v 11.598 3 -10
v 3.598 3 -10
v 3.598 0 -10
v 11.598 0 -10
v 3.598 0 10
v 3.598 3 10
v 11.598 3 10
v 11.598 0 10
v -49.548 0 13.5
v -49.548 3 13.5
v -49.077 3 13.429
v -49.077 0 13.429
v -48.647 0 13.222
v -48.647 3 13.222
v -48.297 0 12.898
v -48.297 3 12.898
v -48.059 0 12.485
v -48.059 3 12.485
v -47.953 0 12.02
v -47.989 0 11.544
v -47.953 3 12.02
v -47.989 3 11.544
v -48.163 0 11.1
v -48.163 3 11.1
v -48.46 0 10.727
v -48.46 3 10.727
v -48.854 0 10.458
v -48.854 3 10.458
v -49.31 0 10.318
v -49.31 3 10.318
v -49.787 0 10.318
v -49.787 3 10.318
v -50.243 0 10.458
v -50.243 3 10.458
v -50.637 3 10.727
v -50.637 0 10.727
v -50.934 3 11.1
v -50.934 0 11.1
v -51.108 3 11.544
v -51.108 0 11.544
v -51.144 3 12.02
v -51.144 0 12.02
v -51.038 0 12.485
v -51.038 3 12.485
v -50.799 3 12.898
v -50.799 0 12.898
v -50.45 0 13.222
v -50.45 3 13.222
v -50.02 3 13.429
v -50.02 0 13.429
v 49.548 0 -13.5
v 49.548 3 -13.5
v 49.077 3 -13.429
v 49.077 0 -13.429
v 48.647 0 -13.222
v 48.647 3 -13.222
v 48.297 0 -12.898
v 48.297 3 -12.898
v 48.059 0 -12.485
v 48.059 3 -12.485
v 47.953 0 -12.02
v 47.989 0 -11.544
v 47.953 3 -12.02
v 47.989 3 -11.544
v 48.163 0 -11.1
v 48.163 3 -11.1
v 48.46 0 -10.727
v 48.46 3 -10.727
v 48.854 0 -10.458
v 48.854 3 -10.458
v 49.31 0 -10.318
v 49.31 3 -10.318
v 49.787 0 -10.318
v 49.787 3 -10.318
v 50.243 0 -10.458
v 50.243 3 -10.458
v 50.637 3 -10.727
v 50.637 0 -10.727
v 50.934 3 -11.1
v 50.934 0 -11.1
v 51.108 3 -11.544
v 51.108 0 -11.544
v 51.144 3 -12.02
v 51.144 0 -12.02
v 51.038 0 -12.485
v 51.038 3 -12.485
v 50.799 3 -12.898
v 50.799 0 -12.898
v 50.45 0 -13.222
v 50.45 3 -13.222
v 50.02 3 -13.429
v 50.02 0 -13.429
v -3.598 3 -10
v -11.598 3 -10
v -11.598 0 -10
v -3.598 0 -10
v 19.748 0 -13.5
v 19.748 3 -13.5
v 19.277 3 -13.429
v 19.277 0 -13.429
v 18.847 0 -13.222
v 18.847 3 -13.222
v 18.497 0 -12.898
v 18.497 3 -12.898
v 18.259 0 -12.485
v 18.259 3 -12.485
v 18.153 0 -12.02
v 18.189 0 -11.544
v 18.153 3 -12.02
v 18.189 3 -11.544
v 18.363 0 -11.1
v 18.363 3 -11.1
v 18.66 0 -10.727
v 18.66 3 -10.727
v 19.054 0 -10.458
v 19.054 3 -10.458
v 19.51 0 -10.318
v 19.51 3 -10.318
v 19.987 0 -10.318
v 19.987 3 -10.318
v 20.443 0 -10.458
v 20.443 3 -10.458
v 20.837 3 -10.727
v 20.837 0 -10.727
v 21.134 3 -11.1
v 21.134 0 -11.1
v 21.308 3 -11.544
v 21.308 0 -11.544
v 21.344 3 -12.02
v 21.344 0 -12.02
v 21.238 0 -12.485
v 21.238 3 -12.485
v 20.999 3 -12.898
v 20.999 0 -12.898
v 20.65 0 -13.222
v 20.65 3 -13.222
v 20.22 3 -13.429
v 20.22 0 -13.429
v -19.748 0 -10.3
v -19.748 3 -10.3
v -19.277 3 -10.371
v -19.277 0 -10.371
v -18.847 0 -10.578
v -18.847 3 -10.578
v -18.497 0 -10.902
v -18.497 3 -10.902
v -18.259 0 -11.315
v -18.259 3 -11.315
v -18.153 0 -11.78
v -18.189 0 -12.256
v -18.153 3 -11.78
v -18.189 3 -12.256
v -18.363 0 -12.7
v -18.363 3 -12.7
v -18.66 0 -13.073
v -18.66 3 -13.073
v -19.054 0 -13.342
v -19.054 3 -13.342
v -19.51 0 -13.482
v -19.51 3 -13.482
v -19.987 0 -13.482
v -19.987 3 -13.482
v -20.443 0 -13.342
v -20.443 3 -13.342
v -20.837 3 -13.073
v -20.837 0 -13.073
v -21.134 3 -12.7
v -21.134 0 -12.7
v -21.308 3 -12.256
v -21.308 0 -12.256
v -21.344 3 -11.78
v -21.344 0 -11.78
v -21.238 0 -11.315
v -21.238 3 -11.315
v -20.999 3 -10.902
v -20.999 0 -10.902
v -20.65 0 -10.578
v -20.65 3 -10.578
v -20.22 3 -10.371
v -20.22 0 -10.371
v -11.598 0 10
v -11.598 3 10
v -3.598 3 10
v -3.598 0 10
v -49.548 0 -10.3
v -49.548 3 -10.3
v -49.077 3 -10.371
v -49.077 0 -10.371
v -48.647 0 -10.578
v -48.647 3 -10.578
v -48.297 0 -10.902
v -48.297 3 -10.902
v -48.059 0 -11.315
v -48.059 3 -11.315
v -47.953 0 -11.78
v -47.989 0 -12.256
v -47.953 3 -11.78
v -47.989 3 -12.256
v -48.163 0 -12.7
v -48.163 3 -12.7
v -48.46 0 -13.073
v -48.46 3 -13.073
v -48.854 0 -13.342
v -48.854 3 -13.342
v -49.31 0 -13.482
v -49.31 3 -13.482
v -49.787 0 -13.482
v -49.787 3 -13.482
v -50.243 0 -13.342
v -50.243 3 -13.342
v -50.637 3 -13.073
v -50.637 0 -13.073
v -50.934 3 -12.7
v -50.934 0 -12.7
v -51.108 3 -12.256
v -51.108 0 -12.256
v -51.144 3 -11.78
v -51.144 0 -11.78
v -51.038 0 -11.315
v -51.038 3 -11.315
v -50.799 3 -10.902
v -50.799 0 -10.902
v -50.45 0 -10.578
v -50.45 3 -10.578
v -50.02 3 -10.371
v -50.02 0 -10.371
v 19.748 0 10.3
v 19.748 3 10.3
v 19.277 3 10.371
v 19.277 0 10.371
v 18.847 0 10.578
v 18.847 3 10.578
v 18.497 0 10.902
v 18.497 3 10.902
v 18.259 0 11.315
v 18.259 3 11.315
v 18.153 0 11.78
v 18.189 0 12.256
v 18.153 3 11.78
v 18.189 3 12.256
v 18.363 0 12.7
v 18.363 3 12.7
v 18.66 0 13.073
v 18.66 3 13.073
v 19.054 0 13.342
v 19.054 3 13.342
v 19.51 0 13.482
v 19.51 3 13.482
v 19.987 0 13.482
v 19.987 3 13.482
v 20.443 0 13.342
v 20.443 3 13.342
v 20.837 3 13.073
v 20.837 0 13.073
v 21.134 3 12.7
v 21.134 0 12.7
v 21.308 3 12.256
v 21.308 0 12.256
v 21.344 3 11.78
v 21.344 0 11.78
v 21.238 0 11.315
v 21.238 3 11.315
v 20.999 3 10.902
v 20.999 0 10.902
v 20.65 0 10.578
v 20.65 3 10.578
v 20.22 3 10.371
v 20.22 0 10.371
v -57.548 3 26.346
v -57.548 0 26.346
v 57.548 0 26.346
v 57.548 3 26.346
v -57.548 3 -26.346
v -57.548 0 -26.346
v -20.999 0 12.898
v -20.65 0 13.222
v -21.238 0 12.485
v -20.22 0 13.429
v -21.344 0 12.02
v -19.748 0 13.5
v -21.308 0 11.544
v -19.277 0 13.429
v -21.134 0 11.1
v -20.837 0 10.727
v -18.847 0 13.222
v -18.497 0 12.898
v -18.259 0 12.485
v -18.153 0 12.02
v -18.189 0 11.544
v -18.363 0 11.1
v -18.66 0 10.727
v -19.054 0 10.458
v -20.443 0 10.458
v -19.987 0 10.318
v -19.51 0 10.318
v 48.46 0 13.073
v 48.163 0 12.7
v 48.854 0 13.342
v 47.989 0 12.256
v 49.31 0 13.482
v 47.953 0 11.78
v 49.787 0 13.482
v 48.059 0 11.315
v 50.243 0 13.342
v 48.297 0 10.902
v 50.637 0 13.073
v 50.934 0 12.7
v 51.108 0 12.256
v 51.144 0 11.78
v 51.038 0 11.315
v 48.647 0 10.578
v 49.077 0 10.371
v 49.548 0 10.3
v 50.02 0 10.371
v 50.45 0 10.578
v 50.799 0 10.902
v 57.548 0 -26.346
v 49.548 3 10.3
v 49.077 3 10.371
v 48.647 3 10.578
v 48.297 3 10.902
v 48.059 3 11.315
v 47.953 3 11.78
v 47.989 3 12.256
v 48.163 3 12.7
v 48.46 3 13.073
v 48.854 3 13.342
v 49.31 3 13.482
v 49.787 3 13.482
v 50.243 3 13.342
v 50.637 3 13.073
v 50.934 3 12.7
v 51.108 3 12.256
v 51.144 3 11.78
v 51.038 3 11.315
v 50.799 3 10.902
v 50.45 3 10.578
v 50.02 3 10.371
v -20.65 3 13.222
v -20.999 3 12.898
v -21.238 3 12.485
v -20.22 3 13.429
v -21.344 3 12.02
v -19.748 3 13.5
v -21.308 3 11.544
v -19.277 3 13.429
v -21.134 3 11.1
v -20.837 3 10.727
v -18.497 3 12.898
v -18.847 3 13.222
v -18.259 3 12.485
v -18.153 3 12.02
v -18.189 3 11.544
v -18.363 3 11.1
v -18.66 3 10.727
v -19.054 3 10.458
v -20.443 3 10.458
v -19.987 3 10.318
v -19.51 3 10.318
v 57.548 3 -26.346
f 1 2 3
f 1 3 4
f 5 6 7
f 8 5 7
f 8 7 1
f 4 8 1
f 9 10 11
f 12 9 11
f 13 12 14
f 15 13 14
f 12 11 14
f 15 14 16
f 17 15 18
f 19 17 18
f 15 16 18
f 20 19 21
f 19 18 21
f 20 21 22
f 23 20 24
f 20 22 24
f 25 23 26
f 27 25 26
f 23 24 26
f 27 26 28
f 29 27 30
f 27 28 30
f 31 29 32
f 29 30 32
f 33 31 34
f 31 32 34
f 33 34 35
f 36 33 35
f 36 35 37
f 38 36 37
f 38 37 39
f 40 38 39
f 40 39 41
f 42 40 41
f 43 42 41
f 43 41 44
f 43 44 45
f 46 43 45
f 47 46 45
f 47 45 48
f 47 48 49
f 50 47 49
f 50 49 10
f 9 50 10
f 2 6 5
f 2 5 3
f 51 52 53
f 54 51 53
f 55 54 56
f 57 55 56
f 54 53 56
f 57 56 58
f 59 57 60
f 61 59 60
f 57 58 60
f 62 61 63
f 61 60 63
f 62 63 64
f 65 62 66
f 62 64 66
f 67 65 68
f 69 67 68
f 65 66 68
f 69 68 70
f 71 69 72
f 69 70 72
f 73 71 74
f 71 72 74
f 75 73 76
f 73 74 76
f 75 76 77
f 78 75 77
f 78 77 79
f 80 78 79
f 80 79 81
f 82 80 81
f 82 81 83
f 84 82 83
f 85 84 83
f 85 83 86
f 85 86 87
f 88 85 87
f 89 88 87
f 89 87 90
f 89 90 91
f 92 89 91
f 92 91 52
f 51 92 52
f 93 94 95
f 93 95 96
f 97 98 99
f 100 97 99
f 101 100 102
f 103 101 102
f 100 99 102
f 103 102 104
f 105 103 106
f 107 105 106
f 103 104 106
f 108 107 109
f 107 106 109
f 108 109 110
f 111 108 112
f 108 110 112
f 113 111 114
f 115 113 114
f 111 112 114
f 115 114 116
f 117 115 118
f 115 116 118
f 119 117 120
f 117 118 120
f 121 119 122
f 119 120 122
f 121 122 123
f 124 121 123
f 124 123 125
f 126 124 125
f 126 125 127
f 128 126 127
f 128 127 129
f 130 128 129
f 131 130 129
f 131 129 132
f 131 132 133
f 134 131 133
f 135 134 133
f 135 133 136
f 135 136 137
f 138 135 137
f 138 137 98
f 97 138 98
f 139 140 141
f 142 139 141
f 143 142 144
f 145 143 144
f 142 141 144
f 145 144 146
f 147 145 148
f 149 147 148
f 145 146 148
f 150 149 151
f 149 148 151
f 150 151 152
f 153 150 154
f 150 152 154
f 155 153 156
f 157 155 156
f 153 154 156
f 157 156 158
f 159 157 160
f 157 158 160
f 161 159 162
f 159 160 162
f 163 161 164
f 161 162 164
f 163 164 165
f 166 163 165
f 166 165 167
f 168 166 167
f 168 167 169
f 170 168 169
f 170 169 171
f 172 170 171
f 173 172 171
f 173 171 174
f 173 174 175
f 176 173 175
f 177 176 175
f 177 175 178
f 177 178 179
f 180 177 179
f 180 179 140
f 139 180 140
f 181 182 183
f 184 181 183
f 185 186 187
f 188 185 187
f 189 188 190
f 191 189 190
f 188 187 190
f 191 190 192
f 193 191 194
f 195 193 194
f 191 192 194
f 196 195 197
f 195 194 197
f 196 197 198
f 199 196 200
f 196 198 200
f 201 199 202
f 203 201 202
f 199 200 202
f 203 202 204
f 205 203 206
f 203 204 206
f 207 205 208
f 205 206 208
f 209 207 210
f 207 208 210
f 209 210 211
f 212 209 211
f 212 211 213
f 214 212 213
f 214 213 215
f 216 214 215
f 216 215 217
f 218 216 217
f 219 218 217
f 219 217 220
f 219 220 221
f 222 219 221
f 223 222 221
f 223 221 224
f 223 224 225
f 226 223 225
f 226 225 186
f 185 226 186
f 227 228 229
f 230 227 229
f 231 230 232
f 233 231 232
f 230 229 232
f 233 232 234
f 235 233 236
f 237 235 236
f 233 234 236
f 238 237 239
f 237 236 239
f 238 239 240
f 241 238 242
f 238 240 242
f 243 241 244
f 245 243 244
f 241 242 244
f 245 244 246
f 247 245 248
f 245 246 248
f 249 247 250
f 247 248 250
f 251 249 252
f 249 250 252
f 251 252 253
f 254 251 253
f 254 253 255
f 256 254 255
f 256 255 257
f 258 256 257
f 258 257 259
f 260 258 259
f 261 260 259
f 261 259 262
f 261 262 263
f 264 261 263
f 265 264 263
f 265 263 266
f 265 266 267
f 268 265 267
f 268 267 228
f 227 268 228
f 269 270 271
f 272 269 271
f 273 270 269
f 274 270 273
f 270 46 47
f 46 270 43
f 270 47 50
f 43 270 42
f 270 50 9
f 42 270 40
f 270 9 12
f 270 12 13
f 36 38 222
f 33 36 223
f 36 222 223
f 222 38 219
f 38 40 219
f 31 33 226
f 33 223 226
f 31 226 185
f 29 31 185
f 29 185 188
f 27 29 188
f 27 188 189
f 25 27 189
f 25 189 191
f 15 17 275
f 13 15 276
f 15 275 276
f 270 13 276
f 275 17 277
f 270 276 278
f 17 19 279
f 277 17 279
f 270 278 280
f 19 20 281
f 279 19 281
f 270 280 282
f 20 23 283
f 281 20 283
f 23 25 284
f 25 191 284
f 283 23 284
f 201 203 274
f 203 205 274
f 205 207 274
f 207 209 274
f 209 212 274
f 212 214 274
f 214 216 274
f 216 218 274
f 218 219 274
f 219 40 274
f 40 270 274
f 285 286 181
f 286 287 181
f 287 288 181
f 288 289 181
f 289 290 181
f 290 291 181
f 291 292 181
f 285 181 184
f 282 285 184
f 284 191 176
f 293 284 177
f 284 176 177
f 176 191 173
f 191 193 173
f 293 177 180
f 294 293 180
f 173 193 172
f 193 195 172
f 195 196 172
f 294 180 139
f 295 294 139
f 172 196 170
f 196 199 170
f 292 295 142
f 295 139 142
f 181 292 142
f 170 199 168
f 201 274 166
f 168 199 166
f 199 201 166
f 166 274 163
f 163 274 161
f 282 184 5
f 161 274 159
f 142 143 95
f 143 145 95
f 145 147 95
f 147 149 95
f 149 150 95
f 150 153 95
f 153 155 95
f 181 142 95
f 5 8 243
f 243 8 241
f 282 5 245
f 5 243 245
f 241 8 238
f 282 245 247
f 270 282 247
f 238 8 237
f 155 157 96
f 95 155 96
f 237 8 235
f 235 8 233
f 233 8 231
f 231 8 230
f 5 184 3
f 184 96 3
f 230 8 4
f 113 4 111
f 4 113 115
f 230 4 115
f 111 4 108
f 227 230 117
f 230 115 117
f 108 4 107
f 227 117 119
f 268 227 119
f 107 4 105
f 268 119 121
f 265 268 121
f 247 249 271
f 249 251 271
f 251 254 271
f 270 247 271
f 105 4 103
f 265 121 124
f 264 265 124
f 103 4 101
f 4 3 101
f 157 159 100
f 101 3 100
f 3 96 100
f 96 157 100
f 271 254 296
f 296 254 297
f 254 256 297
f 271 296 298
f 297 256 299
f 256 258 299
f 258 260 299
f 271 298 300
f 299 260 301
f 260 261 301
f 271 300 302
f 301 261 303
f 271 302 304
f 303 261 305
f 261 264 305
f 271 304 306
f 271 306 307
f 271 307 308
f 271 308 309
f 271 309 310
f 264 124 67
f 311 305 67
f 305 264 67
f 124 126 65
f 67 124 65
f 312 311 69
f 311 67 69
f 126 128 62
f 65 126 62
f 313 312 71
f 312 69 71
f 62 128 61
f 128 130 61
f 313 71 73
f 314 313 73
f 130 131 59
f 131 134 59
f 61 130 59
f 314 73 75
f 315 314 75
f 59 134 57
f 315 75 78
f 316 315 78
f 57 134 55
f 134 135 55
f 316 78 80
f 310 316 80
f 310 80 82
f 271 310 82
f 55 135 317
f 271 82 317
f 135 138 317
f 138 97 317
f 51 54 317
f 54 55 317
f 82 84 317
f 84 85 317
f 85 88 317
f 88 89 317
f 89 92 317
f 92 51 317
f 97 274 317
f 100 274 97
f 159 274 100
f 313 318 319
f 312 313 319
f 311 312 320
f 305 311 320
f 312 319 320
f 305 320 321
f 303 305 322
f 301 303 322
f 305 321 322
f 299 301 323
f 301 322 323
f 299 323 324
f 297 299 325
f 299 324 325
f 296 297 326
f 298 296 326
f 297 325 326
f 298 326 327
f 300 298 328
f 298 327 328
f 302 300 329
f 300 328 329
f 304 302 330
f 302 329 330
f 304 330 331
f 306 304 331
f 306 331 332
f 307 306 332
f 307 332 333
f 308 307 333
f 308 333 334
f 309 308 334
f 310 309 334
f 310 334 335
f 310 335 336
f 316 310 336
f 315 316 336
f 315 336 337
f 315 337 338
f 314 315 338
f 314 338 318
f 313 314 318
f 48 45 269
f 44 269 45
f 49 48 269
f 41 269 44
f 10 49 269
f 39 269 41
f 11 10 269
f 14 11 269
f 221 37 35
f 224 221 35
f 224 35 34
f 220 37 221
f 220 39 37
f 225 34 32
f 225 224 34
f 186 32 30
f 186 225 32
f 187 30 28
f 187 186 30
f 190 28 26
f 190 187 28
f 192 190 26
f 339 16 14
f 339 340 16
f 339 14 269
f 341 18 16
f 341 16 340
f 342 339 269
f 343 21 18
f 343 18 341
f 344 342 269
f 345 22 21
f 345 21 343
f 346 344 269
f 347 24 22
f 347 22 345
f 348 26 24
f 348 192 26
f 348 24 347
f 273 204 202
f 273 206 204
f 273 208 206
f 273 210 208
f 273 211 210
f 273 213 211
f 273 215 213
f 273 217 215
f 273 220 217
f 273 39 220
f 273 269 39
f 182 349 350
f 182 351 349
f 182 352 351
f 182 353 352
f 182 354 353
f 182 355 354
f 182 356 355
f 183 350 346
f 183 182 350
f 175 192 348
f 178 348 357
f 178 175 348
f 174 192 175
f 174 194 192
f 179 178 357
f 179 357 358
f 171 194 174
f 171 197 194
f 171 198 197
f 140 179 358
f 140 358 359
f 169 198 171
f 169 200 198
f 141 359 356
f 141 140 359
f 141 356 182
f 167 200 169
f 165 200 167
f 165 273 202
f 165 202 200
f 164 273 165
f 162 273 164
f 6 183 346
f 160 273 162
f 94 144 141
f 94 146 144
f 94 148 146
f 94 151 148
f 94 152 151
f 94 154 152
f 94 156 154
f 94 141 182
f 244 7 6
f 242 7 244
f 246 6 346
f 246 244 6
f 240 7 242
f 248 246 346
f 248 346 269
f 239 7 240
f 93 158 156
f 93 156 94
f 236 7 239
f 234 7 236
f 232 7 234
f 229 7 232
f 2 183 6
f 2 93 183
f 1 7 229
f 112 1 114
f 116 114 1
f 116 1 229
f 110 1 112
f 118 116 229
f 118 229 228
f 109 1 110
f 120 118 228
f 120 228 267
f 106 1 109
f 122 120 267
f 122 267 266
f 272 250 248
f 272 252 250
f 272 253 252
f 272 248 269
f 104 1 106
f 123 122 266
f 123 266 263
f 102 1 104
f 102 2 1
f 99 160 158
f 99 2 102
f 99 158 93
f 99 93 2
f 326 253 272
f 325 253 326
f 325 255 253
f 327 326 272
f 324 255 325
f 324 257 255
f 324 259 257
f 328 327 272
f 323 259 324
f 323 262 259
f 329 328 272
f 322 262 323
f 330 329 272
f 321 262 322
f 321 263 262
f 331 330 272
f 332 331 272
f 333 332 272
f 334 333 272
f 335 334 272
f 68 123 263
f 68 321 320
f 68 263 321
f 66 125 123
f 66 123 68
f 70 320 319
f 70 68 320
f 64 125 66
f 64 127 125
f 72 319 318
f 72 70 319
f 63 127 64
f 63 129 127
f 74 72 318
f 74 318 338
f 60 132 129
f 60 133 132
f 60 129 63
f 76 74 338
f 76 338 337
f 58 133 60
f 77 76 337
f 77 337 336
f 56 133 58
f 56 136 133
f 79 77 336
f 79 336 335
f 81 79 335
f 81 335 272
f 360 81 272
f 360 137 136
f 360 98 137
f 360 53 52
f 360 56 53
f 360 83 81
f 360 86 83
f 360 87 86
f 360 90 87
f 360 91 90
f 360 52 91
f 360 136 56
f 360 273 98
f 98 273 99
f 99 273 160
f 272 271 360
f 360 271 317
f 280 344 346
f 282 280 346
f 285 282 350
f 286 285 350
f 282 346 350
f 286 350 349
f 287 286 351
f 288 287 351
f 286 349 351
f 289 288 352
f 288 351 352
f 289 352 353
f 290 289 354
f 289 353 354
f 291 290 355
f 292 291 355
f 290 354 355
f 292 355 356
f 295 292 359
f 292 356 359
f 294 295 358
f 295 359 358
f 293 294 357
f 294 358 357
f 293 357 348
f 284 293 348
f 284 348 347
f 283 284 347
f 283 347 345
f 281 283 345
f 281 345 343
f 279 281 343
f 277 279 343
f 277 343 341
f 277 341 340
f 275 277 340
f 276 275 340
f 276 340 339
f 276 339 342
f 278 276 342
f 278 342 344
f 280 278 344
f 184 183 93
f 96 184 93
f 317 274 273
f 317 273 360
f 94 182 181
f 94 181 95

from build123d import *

# Parameters (mm, degrees)
ESBO_O1_W                = 115.09677689
ESBO_O1_H                = 52.692711406
RESSALTO_EXTRUS_O1_DEPTH = 3
ESBO_O2_R                = 1.6
CORTE_EXTRUS_O1_DEPTH    = 64.36361315
ESBO_O3_W                = 8
ESBO_O3_H                = 20
CORTE_EXTRUS_O2_DEPTH    = 64.36361315


with BuildPart() as part:
    # Esboço1 → Ressalto-extrusão1 (new body)
    with BuildSketch(Plane(origin=(0, 0, 0), x_dir=(1, 0, 0), z_dir=(0, 1, 0))):
        Rectangle(ESBO_O1_W, ESBO_O1_H)
    extrude(amount=RESSALTO_EXTRUS_O1_DEPTH)

    # Esboço2 → Corte-extrusão1 (cut, through all)
    with BuildSketch(Plane(origin=(0, 3, 0), x_dir=(1, 0, 0), z_dir=(0, 1, 0))):
        with Locations(Location((-49.548388445, 11.9, 0), (0, 0, 270))):
            Circle(ESBO_O2_R)
        with Locations(Location((-19.748388445, 11.9, 0), (0, 0, 270))):
            Circle(ESBO_O2_R)
        with Locations(Location((-49.548388445, -11.9, 0), (0, 0, 270))):
            Circle(ESBO_O2_R)
        with Locations(Location((-19.748388445, -11.9, 0), (0, 0, 270))):
            Circle(ESBO_O2_R)
        with Locations(Location((49.548388445, -11.9, 0), (0, 0, 90))):
            Circle(ESBO_O2_R)
        with Locations(Location((19.748388445, -11.9, 0), (0, 0, 90))):
            Circle(ESBO_O2_R)
        with Locations(Location((19.748388445, 11.9, 0), (0, 0, 90))):
            Circle(ESBO_O2_R)
        with Locations(Location((49.548388445, 11.9, 0), (0, 0, 90))):
            Circle(ESBO_O2_R)
    extrude(amount=-CORTE_EXTRUS_O1_DEPTH, mode=Mode.SUBTRACT)

    # Esboço3 → Corte-extrusão2 (cut, through all)
    with BuildSketch(Plane(origin=(0, 3, 0), x_dir=(1, 0, 0), z_dir=(0, 1, 0))):
        with Locations((-7.598388445, 0)):
            Rectangle(ESBO_O3_W, ESBO_O3_H)
        with Locations((7.598388445, 0)):
            Rectangle(ESBO_O3_W, ESBO_O3_H)
    extrude(amount=-CORTE_EXTRUS_O2_DEPTH, mode=Mode.SUBTRACT)


solid = part.part
